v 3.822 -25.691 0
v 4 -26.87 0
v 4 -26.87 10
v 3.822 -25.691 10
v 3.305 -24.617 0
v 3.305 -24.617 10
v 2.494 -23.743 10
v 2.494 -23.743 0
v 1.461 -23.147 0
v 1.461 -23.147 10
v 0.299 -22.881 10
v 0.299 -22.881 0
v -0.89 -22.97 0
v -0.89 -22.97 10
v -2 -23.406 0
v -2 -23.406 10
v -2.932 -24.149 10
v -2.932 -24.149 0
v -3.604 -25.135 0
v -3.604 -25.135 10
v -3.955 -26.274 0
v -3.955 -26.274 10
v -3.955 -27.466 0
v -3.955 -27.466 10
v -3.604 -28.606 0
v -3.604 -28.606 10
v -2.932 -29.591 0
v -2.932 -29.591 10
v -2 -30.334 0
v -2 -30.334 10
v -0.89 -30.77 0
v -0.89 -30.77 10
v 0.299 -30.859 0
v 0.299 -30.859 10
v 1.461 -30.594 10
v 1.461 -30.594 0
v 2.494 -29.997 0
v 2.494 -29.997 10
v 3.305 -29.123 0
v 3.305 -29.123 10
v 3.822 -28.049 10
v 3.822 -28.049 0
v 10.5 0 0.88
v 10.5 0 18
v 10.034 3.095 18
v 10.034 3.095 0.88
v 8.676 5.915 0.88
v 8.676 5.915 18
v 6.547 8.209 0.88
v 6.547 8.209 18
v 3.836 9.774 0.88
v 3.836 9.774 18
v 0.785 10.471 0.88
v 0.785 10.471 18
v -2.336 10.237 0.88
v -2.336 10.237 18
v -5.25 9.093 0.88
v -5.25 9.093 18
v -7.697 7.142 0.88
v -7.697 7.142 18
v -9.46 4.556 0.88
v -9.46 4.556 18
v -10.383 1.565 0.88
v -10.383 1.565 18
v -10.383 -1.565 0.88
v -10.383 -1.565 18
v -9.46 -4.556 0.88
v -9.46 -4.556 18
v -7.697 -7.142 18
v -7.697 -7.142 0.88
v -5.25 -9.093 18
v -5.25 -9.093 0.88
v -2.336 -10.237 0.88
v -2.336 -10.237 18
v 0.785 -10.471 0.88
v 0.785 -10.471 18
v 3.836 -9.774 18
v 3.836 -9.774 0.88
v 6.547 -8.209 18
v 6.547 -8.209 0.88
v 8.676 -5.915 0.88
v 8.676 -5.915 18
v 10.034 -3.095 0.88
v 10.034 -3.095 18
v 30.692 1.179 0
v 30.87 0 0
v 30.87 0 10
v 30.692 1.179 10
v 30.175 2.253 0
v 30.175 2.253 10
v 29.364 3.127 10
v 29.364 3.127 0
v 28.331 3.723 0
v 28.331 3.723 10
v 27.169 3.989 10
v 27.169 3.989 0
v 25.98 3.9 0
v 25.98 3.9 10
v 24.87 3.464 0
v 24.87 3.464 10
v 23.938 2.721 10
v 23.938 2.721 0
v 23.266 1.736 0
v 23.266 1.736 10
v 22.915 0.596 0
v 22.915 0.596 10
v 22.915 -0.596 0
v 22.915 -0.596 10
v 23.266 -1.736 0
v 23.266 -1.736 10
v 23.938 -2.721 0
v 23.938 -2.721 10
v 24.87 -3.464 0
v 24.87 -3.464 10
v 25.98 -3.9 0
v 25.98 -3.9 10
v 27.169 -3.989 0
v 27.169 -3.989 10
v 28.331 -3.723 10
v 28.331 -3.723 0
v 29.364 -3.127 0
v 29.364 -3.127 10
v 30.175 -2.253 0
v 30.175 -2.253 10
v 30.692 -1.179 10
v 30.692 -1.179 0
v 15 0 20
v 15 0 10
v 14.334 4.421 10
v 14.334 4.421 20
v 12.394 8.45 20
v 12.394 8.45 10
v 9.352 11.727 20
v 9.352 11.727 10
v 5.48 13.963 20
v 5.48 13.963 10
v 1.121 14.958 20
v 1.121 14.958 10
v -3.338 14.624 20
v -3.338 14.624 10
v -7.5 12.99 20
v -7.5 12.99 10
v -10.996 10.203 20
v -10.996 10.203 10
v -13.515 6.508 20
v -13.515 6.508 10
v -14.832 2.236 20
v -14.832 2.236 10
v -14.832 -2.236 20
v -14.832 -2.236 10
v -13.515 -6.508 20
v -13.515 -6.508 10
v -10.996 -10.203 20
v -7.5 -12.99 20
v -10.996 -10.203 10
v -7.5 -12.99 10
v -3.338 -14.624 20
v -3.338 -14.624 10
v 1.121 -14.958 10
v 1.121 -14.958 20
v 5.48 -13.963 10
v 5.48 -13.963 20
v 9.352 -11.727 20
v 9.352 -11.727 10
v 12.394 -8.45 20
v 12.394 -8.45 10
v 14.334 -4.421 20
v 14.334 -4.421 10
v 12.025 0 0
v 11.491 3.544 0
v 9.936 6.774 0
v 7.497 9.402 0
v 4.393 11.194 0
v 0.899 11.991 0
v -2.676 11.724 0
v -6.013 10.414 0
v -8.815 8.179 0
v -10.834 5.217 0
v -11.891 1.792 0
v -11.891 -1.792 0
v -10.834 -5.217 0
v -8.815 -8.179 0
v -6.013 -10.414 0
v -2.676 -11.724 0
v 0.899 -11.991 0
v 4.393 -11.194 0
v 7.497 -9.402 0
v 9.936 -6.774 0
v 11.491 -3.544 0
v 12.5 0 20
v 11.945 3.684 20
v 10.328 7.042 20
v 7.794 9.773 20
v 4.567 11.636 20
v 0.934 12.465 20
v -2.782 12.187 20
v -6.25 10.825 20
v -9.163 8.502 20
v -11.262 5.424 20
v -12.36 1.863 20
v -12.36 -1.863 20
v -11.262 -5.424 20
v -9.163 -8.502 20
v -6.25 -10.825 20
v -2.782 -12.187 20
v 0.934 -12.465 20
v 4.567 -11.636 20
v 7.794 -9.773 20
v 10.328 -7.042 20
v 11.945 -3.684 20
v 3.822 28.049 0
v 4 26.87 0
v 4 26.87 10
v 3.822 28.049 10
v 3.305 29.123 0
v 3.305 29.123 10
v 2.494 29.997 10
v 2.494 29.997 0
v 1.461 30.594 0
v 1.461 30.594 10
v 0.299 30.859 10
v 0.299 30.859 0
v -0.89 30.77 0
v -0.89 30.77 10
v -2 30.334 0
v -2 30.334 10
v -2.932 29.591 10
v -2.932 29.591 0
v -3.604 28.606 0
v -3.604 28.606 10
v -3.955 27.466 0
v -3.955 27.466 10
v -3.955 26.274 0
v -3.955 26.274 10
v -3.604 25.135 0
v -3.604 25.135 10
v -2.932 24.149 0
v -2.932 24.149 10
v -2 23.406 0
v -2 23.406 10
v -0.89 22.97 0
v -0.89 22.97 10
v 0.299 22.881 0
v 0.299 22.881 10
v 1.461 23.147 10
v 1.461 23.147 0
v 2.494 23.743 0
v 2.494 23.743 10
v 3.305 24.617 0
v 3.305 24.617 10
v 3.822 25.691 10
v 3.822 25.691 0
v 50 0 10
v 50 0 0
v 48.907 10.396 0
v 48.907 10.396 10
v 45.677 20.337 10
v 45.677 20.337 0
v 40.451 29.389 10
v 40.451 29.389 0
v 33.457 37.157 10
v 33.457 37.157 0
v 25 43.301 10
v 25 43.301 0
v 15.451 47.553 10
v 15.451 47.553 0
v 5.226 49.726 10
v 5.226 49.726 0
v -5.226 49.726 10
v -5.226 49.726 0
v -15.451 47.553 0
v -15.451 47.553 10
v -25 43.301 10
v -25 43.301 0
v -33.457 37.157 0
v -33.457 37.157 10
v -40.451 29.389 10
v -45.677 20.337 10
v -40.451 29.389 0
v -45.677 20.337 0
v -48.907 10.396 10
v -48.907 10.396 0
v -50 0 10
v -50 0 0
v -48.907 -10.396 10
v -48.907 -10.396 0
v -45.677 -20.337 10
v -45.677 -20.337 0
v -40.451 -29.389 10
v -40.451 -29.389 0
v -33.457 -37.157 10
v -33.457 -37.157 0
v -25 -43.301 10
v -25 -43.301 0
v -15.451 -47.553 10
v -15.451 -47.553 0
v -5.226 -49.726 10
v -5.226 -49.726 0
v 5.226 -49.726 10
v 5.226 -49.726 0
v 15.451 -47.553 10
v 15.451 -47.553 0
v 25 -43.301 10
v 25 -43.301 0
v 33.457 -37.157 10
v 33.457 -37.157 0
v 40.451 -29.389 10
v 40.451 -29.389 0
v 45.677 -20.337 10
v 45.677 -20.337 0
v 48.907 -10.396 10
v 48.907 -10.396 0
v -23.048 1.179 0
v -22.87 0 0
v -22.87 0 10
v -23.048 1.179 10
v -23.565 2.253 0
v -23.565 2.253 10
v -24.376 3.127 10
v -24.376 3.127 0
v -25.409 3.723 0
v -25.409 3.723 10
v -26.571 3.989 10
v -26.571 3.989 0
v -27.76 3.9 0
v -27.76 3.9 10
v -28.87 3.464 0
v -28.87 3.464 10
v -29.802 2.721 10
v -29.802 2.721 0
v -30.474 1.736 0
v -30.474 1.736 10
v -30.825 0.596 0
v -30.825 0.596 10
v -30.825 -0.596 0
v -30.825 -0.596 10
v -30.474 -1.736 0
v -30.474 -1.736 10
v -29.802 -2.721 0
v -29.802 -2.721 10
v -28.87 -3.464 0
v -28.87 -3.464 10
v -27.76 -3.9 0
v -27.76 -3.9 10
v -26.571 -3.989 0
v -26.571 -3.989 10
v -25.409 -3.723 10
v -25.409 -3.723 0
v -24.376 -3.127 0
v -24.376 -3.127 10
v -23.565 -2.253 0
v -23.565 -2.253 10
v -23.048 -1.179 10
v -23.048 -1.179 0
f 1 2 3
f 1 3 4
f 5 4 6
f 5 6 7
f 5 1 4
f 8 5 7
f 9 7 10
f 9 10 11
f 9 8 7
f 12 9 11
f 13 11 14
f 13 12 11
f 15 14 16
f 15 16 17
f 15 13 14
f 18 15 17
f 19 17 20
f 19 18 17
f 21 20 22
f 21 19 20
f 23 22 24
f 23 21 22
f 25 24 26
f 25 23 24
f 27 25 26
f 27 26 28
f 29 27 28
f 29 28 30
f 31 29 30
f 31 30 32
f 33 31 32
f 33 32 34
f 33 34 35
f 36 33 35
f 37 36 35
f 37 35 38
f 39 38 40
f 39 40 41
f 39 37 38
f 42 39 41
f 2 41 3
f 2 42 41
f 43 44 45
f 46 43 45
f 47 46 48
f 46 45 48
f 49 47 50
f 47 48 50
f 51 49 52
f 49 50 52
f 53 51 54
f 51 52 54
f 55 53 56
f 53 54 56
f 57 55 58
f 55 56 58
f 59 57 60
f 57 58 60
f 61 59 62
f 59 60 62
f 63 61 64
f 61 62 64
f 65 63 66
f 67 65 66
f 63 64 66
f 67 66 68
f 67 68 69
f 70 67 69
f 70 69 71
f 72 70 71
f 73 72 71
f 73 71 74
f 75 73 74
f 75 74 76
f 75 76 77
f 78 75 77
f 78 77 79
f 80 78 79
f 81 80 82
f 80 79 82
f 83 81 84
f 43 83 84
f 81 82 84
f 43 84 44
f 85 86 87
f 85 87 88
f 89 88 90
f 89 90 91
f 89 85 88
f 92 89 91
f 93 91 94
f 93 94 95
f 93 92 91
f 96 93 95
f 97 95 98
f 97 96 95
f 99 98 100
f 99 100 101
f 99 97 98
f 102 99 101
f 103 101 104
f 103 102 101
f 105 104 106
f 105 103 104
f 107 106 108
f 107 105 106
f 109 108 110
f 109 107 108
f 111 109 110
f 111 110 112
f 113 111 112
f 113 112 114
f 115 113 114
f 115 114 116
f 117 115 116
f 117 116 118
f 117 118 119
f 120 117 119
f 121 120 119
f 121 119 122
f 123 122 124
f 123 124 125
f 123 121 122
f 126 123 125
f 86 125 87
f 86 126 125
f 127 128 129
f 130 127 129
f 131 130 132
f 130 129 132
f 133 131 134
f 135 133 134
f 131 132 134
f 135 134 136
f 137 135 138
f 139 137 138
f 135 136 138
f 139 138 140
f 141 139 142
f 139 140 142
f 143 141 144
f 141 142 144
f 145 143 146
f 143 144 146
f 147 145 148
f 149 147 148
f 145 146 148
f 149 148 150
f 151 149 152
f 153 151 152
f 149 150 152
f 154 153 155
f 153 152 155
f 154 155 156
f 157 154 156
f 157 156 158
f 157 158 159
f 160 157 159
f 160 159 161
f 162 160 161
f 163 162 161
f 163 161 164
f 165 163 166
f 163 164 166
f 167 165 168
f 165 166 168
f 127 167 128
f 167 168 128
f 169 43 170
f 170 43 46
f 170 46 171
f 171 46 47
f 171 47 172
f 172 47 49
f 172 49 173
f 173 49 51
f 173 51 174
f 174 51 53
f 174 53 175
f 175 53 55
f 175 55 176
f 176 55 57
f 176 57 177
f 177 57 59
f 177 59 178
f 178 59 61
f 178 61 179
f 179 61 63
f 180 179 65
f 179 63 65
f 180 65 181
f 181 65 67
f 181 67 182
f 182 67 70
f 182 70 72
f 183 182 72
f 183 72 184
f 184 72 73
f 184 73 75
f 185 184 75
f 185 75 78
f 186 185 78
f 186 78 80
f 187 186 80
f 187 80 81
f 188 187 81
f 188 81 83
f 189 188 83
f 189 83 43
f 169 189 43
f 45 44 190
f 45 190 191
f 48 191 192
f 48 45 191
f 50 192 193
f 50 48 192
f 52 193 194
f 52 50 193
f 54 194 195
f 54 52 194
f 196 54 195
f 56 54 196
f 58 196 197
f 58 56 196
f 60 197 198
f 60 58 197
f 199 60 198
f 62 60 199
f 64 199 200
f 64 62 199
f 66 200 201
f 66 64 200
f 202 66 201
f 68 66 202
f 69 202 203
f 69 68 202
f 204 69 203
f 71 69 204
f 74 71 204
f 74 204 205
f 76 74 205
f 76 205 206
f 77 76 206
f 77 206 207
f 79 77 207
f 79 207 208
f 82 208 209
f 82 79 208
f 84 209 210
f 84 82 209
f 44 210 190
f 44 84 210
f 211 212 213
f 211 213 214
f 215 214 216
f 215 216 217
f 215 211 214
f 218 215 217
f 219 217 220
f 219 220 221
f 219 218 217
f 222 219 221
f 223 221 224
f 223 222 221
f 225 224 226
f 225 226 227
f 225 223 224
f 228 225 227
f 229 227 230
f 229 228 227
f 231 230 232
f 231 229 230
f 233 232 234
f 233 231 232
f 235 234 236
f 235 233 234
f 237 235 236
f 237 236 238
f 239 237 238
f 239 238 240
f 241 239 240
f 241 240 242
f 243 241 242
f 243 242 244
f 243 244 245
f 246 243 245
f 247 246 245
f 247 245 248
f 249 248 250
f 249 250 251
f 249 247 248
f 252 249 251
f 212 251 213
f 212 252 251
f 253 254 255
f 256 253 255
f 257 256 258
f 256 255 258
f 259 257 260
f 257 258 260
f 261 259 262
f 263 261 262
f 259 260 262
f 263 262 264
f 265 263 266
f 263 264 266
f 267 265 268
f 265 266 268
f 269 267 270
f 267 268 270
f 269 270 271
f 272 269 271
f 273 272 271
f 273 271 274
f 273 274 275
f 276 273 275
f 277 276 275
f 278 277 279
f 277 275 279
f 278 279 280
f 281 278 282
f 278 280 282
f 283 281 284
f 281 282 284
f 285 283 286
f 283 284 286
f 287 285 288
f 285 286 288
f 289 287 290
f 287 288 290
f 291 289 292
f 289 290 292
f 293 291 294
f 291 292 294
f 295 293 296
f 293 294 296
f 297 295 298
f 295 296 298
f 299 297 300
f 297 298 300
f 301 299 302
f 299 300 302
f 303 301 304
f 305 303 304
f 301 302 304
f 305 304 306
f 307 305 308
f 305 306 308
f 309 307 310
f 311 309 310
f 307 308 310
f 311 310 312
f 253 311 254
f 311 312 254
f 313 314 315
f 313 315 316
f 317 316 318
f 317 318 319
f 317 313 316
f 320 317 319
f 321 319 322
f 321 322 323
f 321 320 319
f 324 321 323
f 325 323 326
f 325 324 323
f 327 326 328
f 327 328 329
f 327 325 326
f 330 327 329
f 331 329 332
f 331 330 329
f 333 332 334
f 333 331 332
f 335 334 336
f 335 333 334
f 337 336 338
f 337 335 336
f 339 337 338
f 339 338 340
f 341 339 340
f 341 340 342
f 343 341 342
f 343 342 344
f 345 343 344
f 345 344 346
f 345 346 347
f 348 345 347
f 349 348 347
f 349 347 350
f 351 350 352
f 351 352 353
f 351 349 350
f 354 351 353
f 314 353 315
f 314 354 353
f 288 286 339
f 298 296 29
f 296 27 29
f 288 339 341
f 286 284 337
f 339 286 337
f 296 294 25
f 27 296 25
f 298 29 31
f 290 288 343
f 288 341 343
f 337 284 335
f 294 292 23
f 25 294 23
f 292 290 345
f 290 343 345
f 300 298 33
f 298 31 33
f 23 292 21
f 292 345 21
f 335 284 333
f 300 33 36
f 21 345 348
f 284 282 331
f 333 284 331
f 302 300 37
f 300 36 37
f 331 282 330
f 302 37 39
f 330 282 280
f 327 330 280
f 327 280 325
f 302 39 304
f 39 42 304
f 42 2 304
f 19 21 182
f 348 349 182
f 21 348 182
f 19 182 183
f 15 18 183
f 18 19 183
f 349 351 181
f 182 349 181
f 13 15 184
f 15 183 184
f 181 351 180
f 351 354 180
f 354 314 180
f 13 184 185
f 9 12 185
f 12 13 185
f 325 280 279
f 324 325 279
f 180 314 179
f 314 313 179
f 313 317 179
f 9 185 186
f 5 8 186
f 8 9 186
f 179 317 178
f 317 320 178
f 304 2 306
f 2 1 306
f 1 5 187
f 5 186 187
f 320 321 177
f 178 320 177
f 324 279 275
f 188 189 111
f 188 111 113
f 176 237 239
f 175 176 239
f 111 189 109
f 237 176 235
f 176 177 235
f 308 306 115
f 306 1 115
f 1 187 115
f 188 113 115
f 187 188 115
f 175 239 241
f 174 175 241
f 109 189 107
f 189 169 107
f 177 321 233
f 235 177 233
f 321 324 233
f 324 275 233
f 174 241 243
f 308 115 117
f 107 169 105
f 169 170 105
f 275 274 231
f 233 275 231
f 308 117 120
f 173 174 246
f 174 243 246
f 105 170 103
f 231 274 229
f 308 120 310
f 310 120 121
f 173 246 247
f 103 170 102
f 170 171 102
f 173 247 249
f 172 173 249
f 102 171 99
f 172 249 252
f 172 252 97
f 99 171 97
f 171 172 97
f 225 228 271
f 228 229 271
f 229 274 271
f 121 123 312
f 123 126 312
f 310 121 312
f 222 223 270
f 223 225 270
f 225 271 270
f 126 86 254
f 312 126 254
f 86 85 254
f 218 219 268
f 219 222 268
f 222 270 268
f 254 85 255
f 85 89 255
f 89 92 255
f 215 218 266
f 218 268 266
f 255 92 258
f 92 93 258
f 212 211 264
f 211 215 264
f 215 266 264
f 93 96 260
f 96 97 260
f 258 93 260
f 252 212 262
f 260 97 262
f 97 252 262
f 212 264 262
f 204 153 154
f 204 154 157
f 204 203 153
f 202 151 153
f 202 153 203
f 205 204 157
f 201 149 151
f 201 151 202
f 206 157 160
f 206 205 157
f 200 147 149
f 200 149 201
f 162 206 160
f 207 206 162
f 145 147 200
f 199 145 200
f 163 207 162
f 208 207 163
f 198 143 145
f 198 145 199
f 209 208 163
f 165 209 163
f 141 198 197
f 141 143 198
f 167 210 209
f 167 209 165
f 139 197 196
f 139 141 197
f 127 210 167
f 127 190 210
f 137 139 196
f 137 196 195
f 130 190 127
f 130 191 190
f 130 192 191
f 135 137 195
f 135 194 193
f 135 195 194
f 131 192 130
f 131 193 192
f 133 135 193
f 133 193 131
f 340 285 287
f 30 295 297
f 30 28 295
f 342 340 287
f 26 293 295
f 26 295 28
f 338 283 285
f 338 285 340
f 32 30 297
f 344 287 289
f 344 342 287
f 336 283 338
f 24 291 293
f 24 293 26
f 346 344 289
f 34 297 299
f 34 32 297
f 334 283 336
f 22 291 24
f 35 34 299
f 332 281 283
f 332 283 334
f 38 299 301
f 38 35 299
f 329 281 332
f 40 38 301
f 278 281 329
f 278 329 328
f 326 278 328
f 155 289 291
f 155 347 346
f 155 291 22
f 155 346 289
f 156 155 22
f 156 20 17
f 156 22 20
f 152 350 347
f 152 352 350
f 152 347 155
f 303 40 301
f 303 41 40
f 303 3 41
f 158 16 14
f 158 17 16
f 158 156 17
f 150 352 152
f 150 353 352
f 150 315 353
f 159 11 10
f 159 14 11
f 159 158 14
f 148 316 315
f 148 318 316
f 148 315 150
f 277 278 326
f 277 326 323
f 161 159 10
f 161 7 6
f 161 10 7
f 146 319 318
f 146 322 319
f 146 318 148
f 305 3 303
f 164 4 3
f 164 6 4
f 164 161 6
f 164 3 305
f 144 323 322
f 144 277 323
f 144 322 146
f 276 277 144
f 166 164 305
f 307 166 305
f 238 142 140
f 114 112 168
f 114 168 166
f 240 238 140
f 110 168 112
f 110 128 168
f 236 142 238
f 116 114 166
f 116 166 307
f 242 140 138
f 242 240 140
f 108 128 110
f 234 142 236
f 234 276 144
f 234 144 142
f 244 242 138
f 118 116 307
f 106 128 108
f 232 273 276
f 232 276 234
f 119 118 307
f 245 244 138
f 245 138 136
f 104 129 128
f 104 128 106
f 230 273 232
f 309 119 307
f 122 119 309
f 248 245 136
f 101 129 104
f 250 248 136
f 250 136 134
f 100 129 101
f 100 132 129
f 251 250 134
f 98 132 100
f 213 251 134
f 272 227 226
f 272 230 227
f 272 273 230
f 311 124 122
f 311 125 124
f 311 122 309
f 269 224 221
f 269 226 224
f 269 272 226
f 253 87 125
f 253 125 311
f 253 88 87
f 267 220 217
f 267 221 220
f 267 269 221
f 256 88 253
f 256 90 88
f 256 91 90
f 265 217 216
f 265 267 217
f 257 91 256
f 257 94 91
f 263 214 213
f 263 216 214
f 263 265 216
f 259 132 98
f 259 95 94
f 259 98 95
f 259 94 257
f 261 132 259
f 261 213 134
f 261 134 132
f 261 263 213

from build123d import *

# Parameters (mm, degrees)
SCHIZZO1_R                       = 50
SCHIZZO1_R_2                     = 4
ESTRUSIONE_ESTRUSIONE1_DEPTH     = 10
SCHIZZO2_R                       = 15
ESTRUSIONE_ESTRUSIONE2_DEPTH     = 10
FORO_FILETTATO_M24_1_D           = 21
FORO_FILETTATO_M24_1_CSINK_D     = 24.05
FORO_FILETTATO_M24_1_CSINK_ANGLE = 120
SMUSSO1_SIZE                     = 2


with BuildPart() as part:
    # Schizzo1 → Estrusione-Estrusione1 (new body)
    with BuildSketch(Plane.XY):
        Circle(SCHIZZO1_R)
        with Locations((0, 26.870057685)):
            Circle(SCHIZZO1_R_2, mode=Mode.SUBTRACT)
        with Locations((26.870057685, 0)):
            Circle(SCHIZZO1_R_2, mode=Mode.SUBTRACT)
        with Locations((0, -26.870057685)):
            Circle(SCHIZZO1_R_2, mode=Mode.SUBTRACT)
        with Locations((-26.870057685, 0)):
            Circle(SCHIZZO1_R_2, mode=Mode.SUBTRACT)
    extrude(amount=ESTRUSIONE_ESTRUSIONE1_DEPTH)

    # Schizzo2 → Estrusione-Estrusione2 (add)
    with BuildSketch(Plane.XY.offset(10)):
        Circle(SCHIZZO2_R)
    extrude(amount=ESTRUSIONE_ESTRUSIONE2_DEPTH)

    # Foro filettato M24-1 (through all)
    with Locations(Plane(origin=(0, 0, 0), x_dir=(-1, 0, 0), z_dir=(0, 0, -1))):
        with Locations((0, 0)):
            CounterSinkHole(FORO_FILETTATO_M24_1_D / 2, FORO_FILETTATO_M24_1_CSINK_D / 2, counter_sink_angle=FORO_FILETTATO_M24_1_CSINK_ANGLE)

    # Smusso1
    smusso1_edges = [part.edges().sort_by_distance(p)[0] for p in [
        (-10.5, 0, 20),
    ]]
    chamfer(smusso1_edges, length=SMUSSO1_SIZE)


solid = part.part
